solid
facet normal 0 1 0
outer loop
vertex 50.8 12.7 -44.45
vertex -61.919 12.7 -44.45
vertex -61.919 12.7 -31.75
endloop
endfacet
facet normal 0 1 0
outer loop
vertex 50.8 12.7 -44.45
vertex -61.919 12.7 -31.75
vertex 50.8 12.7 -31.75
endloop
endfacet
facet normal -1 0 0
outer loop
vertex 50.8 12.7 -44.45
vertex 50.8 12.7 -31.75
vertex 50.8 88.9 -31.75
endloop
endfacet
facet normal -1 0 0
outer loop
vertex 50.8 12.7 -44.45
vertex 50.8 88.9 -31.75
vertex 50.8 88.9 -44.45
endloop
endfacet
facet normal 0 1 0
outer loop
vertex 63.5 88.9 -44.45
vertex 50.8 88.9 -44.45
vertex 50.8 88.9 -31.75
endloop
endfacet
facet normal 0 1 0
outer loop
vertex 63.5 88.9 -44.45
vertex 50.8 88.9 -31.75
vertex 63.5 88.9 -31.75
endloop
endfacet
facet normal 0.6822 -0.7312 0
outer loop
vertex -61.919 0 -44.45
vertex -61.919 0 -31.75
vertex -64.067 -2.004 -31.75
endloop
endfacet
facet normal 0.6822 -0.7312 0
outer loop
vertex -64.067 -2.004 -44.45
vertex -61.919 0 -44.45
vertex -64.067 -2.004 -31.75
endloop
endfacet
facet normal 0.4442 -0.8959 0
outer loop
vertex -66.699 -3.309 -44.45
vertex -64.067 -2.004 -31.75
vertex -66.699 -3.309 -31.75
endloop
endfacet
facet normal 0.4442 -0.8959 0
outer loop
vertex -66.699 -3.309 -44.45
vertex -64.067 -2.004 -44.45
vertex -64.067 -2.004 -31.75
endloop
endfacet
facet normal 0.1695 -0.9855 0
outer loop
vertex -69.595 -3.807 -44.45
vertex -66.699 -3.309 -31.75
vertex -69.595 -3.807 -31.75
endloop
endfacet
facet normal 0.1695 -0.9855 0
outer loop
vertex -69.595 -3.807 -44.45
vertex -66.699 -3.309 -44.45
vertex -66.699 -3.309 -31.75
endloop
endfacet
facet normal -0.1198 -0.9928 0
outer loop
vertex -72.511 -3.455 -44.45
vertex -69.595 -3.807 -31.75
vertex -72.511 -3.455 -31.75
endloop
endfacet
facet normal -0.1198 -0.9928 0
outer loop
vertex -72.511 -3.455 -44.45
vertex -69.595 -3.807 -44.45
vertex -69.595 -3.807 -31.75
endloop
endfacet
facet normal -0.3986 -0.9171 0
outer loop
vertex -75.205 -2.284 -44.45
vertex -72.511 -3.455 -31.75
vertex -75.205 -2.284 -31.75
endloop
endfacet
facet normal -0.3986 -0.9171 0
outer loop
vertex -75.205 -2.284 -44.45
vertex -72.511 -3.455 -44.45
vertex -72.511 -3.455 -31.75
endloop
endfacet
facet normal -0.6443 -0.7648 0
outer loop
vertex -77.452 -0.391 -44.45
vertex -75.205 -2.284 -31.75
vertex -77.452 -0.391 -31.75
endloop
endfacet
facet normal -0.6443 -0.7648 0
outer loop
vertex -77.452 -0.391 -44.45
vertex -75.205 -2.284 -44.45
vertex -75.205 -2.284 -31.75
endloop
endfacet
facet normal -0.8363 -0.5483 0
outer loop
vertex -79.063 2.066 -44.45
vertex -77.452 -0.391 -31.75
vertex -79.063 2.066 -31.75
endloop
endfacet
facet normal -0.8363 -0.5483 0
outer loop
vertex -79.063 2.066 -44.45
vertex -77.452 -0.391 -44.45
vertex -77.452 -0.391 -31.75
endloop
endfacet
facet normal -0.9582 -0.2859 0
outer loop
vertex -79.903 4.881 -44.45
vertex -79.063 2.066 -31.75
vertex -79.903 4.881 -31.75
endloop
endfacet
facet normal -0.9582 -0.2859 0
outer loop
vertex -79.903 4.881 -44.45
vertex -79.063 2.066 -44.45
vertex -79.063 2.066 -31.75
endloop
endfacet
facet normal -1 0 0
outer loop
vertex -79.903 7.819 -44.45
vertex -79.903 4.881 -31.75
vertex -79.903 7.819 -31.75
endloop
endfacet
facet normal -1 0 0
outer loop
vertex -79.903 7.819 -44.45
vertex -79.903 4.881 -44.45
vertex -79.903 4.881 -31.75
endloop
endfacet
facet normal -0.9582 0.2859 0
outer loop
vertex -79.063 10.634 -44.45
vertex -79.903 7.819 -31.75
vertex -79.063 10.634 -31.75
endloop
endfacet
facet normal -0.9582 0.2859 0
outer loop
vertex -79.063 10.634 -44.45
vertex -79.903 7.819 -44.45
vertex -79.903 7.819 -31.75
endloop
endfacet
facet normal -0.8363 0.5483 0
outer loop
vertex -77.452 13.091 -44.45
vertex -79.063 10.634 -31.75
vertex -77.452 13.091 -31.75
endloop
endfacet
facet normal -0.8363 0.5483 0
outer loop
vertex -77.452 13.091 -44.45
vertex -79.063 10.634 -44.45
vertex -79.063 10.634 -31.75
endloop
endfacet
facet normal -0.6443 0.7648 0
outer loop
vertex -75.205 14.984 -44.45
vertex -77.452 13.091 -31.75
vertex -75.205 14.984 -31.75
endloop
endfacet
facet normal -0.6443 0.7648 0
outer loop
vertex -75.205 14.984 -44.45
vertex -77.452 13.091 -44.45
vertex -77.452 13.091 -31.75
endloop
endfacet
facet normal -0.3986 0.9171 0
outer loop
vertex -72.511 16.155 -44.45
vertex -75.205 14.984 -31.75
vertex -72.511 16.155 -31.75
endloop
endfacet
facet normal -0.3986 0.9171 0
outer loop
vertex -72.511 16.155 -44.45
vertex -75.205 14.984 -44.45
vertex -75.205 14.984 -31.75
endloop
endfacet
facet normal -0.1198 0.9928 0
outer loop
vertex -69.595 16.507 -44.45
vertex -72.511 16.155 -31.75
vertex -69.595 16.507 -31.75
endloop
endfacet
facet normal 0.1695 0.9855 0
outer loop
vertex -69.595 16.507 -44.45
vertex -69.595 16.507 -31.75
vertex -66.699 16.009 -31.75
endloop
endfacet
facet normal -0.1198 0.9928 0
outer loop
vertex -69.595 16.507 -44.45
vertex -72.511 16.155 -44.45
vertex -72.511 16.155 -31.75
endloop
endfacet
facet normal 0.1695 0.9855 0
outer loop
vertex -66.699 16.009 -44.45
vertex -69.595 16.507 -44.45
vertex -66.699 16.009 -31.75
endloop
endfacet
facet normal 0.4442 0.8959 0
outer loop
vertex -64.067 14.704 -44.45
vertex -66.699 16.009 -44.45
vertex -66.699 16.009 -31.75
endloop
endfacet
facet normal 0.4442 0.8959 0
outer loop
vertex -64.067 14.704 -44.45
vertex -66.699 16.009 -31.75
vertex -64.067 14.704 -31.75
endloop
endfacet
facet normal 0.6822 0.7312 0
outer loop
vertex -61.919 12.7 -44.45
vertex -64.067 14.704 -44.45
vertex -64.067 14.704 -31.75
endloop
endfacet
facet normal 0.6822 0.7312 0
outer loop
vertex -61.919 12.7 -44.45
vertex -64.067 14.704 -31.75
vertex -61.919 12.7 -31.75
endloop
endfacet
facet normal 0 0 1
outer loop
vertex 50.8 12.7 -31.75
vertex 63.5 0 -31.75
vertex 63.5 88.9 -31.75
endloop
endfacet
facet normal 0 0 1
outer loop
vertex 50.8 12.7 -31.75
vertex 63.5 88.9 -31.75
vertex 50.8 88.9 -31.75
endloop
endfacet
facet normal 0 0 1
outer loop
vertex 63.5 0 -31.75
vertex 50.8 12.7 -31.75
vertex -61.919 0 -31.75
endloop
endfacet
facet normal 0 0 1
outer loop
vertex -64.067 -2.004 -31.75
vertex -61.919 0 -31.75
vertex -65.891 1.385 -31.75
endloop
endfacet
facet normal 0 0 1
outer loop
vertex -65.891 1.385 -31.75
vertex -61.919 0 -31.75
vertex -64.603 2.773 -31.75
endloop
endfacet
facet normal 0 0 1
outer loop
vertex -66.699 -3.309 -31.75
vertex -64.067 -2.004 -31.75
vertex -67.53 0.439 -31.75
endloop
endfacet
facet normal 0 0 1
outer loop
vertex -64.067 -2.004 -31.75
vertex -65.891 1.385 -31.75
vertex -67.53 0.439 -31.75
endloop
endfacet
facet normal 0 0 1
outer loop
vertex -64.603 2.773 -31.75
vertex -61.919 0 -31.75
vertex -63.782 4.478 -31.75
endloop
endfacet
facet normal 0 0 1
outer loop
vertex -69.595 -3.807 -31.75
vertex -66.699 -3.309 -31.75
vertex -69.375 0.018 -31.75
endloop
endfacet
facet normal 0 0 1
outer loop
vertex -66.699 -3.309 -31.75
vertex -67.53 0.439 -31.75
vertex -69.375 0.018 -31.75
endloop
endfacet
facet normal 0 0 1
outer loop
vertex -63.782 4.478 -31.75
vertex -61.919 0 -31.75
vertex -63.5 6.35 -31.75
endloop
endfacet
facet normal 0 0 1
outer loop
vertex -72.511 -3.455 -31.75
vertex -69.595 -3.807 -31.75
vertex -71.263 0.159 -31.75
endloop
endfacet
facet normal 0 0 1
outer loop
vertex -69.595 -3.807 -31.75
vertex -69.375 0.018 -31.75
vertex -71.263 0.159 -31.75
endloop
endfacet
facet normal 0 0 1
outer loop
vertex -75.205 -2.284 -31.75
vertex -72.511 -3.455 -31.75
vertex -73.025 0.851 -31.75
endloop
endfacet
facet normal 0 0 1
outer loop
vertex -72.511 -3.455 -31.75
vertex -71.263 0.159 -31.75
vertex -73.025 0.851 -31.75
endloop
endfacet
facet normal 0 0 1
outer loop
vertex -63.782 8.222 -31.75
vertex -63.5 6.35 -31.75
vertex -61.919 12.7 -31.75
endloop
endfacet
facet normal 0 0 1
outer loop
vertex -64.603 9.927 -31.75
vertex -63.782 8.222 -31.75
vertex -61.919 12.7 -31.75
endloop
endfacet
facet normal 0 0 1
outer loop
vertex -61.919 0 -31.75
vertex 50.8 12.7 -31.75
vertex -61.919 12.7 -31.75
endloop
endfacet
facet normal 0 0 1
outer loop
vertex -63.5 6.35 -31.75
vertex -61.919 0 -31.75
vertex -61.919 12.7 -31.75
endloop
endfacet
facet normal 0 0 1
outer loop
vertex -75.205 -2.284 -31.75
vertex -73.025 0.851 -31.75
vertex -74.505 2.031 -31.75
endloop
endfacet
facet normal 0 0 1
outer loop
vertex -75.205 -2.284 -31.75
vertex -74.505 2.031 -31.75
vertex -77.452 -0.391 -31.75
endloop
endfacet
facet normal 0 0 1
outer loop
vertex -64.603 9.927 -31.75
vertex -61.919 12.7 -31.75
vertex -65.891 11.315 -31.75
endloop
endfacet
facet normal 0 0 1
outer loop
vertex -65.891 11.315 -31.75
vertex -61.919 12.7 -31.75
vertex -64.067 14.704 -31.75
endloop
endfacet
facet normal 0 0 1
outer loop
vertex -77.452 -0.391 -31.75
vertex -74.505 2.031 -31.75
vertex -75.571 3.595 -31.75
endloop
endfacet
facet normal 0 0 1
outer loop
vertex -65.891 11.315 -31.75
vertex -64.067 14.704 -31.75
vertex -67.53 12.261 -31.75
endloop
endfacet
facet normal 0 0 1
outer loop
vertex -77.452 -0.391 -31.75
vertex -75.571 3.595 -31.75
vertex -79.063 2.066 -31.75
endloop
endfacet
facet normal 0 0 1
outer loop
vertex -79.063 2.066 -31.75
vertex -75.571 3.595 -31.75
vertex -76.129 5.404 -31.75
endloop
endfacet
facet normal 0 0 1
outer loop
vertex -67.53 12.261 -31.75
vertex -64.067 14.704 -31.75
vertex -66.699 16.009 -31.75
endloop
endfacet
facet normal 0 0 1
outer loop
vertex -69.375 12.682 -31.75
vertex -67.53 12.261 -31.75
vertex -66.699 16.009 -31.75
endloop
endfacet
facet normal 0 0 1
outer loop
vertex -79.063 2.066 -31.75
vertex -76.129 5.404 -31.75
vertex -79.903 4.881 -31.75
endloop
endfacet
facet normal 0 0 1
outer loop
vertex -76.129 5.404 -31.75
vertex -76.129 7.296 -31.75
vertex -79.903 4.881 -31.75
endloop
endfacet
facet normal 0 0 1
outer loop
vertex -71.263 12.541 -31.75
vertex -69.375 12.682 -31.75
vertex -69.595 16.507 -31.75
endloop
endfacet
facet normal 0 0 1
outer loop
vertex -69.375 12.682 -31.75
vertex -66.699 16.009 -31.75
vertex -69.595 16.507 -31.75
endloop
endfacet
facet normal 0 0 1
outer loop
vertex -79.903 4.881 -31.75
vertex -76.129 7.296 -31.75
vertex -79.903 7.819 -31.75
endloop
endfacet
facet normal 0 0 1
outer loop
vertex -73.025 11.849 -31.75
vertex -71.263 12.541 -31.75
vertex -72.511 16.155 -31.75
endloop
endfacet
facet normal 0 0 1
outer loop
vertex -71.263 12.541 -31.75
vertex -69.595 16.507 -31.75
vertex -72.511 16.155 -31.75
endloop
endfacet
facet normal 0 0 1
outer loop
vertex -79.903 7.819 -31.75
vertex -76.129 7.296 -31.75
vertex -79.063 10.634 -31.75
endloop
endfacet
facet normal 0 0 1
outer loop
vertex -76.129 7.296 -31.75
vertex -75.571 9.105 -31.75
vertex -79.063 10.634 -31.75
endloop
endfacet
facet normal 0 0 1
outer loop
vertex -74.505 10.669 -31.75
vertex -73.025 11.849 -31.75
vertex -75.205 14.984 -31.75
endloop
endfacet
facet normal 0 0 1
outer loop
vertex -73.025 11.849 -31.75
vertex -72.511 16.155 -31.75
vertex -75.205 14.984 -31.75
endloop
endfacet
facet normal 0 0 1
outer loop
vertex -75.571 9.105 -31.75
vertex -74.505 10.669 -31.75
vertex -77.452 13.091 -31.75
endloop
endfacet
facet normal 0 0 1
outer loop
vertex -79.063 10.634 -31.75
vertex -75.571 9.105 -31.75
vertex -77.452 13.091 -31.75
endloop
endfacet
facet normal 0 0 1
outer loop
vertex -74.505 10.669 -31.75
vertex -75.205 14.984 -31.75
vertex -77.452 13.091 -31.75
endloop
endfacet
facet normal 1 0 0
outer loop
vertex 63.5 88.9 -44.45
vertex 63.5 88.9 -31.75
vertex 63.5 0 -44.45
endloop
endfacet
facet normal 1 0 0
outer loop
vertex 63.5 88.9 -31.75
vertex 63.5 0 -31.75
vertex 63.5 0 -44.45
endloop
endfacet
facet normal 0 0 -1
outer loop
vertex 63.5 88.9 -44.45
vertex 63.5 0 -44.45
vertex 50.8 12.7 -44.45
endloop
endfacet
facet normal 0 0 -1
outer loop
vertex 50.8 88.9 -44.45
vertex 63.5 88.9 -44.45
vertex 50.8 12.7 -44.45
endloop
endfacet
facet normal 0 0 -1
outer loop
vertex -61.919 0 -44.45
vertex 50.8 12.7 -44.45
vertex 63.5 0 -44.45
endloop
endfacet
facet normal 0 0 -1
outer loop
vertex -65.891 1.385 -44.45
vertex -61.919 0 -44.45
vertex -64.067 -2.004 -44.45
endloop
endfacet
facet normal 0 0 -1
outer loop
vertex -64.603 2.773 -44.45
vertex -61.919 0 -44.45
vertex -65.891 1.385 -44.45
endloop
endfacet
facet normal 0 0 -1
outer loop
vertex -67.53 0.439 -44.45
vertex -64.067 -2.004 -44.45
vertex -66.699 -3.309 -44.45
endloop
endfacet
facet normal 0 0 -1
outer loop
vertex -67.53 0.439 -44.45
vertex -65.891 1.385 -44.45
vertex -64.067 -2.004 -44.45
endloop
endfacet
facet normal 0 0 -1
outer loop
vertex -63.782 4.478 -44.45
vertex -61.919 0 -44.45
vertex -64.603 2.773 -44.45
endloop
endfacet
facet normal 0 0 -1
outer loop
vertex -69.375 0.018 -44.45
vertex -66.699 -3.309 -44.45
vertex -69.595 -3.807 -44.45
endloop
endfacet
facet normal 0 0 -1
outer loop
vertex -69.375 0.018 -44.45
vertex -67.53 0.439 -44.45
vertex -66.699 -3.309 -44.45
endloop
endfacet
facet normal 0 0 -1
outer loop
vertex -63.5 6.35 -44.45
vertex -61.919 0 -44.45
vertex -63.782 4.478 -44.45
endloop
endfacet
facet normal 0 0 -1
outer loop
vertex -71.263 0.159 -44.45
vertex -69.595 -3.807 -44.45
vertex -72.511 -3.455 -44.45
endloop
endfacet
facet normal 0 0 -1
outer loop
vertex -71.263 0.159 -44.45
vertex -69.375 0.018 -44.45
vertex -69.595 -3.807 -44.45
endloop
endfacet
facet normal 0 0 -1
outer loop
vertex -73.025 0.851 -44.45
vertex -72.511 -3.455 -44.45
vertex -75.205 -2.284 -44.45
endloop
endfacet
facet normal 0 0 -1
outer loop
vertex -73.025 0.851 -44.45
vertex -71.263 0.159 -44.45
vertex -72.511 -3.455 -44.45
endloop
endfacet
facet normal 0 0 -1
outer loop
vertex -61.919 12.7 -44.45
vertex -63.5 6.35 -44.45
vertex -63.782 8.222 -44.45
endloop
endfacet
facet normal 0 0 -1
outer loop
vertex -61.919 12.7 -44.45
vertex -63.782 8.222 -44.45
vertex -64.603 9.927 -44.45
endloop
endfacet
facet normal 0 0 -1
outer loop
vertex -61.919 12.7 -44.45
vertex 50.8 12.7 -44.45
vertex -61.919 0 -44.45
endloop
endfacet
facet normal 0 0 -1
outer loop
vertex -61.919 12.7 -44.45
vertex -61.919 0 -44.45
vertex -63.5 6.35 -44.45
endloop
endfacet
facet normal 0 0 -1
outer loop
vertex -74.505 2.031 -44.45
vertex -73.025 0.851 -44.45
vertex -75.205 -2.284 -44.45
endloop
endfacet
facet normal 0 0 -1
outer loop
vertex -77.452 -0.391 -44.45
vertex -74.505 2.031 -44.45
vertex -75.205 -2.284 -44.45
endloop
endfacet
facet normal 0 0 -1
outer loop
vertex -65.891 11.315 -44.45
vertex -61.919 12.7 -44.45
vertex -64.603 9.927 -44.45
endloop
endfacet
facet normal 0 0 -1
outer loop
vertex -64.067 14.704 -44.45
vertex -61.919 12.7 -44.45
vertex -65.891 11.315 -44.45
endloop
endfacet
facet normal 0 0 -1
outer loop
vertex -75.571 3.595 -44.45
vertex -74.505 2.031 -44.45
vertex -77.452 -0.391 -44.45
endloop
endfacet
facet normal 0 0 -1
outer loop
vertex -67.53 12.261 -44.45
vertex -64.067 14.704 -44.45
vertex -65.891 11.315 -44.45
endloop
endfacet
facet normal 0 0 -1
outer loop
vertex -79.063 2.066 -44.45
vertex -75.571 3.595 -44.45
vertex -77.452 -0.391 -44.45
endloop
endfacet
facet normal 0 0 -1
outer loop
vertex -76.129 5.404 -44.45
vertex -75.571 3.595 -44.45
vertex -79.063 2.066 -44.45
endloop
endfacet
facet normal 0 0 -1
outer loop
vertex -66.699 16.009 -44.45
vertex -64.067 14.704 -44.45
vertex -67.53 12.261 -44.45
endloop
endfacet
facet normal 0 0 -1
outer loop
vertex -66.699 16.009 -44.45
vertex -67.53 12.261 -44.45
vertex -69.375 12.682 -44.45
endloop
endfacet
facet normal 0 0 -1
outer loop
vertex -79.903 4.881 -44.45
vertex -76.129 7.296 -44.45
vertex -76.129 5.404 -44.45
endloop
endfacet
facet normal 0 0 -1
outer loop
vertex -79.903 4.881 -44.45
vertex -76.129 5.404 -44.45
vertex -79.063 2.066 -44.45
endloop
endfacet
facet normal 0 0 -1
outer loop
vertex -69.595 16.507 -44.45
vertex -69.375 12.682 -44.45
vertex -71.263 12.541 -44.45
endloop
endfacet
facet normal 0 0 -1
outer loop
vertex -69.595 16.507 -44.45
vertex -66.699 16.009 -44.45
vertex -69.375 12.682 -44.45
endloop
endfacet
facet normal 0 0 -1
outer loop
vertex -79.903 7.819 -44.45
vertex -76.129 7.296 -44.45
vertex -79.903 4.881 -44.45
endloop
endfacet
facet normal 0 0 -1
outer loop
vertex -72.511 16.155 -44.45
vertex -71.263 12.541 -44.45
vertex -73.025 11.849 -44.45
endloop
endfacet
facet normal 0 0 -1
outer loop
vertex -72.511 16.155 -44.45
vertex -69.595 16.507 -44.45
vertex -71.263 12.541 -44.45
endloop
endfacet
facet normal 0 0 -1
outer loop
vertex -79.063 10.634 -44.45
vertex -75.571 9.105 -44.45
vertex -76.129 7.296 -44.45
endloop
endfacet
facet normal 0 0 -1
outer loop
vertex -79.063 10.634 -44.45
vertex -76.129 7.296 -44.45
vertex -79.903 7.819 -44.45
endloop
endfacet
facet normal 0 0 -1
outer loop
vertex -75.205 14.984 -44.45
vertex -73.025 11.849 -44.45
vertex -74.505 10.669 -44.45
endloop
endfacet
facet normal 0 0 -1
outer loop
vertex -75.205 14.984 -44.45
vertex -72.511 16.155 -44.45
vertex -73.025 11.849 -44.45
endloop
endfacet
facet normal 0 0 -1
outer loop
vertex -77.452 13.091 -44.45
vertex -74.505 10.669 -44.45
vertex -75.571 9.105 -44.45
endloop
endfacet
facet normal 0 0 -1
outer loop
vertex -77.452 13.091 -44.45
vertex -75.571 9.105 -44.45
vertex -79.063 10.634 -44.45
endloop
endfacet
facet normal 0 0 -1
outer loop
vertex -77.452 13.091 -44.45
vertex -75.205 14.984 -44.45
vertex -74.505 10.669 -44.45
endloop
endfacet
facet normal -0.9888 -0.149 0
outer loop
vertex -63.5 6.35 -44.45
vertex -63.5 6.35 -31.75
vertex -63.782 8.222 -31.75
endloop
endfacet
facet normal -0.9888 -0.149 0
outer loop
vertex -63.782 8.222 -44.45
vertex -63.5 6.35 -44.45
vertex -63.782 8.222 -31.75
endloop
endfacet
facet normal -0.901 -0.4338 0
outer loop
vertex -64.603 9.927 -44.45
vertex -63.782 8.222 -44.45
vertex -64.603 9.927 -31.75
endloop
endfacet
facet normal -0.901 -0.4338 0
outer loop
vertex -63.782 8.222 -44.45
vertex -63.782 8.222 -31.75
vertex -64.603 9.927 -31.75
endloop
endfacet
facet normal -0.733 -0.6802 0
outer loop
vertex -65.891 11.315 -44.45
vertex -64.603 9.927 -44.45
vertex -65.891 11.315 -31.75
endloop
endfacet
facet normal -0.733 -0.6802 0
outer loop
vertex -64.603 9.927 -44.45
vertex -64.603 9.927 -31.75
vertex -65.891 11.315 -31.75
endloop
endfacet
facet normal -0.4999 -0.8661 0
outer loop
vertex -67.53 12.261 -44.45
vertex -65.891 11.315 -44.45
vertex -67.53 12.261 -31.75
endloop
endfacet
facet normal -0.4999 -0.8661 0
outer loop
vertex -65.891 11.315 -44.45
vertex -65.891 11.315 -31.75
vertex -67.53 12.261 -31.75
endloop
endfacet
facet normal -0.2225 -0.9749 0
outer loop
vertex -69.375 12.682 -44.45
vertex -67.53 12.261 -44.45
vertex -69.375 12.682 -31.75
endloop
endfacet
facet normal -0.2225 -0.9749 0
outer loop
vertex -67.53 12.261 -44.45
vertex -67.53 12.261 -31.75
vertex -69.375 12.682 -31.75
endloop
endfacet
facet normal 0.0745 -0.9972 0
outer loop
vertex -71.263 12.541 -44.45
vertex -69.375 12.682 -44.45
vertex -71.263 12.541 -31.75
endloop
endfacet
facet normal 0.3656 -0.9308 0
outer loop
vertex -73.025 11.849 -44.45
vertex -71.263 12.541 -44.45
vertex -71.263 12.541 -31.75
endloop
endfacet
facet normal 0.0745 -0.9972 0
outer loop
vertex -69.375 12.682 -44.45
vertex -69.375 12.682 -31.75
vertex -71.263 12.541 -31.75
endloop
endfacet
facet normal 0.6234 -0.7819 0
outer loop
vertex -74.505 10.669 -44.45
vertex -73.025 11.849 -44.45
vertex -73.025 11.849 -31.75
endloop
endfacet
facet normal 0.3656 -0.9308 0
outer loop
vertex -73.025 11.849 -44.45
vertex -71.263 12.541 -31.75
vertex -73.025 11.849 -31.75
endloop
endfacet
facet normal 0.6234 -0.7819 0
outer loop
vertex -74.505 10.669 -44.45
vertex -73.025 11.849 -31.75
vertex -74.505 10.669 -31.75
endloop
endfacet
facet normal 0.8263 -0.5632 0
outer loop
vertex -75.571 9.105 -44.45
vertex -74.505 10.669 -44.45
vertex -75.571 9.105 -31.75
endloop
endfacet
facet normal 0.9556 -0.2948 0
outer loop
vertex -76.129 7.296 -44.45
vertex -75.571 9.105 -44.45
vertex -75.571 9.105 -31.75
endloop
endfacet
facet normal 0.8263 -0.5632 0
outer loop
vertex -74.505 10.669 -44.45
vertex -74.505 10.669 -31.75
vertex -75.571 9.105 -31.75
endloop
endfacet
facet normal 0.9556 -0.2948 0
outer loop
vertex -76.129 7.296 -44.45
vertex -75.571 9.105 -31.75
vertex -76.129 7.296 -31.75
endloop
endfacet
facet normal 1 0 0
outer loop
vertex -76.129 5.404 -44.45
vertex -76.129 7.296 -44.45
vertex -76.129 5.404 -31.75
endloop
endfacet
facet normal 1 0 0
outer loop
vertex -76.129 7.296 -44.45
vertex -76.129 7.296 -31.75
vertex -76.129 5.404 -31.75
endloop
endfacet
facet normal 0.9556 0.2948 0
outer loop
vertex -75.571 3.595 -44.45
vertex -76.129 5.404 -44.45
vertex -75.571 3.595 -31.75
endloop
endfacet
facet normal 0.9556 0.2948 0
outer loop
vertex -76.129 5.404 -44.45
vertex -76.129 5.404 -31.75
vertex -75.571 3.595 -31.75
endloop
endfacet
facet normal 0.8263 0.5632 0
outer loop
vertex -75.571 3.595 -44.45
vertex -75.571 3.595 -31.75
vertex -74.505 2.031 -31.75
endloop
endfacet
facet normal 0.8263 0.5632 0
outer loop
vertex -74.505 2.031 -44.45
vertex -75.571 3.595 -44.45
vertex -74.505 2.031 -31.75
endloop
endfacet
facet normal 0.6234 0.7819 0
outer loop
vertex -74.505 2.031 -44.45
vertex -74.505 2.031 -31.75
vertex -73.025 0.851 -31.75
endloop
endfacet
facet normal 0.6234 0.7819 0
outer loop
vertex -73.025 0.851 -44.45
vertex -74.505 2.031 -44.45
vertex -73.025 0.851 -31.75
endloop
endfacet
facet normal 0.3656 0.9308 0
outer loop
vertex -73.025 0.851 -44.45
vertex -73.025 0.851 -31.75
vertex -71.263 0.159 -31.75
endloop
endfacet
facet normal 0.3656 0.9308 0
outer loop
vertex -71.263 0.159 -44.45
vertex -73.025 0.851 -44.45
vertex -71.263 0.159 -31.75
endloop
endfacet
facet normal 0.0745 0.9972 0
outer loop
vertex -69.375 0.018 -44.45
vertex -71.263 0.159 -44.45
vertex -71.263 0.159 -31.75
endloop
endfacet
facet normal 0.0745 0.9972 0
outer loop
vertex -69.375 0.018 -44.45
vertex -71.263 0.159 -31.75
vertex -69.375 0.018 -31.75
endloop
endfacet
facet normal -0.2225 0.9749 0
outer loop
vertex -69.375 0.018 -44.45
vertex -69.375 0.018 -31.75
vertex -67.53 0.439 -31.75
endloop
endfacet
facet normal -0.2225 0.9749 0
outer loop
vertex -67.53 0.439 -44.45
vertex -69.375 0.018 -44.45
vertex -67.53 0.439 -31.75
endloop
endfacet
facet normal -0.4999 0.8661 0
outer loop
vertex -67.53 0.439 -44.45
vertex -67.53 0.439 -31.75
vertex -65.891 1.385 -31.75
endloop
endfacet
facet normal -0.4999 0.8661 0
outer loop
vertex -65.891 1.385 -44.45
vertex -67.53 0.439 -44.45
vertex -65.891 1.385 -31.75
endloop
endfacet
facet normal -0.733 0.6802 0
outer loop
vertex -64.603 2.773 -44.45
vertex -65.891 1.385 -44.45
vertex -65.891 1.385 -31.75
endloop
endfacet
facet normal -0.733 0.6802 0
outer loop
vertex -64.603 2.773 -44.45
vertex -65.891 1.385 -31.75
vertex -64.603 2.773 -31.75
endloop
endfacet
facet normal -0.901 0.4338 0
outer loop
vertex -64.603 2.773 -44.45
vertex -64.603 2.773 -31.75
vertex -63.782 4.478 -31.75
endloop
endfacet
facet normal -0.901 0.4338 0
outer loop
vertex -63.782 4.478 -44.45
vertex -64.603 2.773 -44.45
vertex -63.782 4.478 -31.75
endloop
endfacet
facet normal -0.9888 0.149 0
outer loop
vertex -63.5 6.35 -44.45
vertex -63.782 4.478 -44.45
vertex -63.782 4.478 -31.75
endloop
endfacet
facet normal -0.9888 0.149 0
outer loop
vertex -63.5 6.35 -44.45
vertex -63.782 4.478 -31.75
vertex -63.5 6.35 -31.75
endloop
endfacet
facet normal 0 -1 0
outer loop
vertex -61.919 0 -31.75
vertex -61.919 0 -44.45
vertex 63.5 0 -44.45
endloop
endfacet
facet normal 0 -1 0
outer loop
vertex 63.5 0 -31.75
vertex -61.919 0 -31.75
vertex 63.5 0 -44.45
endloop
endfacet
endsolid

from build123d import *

# Parameters (mm, degrees)
SKETCH1_W                  = 127
SKETCH1_H                  = 12.7
BOSS_EXTRUDE1_DEPTH        = 12.7
SKETCH9_W                  = 12.7
SKETCH9_H                  = 12.7
BOSS_EXTRUDE2_DEPTH        = 76.2
SKETCH10_R                 = 10.16
BOSS_EXTRUDE3_DEPTH        = 12.7
F_1_2_0_5_DIAMETER_HOLE1_D = 12.7


with BuildPart() as part:
    # Sketch1 → Boss-Extrude1 (new body)
    with BuildSketch(Plane(origin=(0, 0, 0), x_dir=(1, 0, 0), z_dir=(0, 1, 0))):
        with Locations((0, 38.1)):
            Rectangle(SKETCH1_W, SKETCH1_H)
    extrude(amount=BOSS_EXTRUDE1_DEPTH)

    # Sketch9 → Boss-Extrude2 (add)
    with BuildSketch(Plane(origin=(0, 12.7, 0), x_dir=(1, 0, 0), z_dir=(0, 1, 0))):
        with Locations((57.15, 38.1)):
            Rectangle(SKETCH9_W, SKETCH9_H)
    extrude(amount=BOSS_EXTRUDE2_DEPTH)

    # Sketch10 → Boss-Extrude3 (add)
    with BuildSketch(Plane(origin=(0, 0, -44.45), x_dir=(-1, 0, 0), z_dir=(0, 0, -1))):
        with Locations((69.85, 6.35)):
            Circle(SKETCH10_R)
    extrude(amount=-BOSS_EXTRUDE3_DEPTH)

    # 1/2 (0.5) Diameter Hole1 (through all)
    with Locations(Plane(origin=(-69.85, 6.35, -44.45), x_dir=(-1, 0, 0), z_dir=(0, 0, -1))):
        with Locations((0, 0)):
            Hole(F_1_2_0_5_DIAMETER_HOLE1_D / 2)


solid = part.part
